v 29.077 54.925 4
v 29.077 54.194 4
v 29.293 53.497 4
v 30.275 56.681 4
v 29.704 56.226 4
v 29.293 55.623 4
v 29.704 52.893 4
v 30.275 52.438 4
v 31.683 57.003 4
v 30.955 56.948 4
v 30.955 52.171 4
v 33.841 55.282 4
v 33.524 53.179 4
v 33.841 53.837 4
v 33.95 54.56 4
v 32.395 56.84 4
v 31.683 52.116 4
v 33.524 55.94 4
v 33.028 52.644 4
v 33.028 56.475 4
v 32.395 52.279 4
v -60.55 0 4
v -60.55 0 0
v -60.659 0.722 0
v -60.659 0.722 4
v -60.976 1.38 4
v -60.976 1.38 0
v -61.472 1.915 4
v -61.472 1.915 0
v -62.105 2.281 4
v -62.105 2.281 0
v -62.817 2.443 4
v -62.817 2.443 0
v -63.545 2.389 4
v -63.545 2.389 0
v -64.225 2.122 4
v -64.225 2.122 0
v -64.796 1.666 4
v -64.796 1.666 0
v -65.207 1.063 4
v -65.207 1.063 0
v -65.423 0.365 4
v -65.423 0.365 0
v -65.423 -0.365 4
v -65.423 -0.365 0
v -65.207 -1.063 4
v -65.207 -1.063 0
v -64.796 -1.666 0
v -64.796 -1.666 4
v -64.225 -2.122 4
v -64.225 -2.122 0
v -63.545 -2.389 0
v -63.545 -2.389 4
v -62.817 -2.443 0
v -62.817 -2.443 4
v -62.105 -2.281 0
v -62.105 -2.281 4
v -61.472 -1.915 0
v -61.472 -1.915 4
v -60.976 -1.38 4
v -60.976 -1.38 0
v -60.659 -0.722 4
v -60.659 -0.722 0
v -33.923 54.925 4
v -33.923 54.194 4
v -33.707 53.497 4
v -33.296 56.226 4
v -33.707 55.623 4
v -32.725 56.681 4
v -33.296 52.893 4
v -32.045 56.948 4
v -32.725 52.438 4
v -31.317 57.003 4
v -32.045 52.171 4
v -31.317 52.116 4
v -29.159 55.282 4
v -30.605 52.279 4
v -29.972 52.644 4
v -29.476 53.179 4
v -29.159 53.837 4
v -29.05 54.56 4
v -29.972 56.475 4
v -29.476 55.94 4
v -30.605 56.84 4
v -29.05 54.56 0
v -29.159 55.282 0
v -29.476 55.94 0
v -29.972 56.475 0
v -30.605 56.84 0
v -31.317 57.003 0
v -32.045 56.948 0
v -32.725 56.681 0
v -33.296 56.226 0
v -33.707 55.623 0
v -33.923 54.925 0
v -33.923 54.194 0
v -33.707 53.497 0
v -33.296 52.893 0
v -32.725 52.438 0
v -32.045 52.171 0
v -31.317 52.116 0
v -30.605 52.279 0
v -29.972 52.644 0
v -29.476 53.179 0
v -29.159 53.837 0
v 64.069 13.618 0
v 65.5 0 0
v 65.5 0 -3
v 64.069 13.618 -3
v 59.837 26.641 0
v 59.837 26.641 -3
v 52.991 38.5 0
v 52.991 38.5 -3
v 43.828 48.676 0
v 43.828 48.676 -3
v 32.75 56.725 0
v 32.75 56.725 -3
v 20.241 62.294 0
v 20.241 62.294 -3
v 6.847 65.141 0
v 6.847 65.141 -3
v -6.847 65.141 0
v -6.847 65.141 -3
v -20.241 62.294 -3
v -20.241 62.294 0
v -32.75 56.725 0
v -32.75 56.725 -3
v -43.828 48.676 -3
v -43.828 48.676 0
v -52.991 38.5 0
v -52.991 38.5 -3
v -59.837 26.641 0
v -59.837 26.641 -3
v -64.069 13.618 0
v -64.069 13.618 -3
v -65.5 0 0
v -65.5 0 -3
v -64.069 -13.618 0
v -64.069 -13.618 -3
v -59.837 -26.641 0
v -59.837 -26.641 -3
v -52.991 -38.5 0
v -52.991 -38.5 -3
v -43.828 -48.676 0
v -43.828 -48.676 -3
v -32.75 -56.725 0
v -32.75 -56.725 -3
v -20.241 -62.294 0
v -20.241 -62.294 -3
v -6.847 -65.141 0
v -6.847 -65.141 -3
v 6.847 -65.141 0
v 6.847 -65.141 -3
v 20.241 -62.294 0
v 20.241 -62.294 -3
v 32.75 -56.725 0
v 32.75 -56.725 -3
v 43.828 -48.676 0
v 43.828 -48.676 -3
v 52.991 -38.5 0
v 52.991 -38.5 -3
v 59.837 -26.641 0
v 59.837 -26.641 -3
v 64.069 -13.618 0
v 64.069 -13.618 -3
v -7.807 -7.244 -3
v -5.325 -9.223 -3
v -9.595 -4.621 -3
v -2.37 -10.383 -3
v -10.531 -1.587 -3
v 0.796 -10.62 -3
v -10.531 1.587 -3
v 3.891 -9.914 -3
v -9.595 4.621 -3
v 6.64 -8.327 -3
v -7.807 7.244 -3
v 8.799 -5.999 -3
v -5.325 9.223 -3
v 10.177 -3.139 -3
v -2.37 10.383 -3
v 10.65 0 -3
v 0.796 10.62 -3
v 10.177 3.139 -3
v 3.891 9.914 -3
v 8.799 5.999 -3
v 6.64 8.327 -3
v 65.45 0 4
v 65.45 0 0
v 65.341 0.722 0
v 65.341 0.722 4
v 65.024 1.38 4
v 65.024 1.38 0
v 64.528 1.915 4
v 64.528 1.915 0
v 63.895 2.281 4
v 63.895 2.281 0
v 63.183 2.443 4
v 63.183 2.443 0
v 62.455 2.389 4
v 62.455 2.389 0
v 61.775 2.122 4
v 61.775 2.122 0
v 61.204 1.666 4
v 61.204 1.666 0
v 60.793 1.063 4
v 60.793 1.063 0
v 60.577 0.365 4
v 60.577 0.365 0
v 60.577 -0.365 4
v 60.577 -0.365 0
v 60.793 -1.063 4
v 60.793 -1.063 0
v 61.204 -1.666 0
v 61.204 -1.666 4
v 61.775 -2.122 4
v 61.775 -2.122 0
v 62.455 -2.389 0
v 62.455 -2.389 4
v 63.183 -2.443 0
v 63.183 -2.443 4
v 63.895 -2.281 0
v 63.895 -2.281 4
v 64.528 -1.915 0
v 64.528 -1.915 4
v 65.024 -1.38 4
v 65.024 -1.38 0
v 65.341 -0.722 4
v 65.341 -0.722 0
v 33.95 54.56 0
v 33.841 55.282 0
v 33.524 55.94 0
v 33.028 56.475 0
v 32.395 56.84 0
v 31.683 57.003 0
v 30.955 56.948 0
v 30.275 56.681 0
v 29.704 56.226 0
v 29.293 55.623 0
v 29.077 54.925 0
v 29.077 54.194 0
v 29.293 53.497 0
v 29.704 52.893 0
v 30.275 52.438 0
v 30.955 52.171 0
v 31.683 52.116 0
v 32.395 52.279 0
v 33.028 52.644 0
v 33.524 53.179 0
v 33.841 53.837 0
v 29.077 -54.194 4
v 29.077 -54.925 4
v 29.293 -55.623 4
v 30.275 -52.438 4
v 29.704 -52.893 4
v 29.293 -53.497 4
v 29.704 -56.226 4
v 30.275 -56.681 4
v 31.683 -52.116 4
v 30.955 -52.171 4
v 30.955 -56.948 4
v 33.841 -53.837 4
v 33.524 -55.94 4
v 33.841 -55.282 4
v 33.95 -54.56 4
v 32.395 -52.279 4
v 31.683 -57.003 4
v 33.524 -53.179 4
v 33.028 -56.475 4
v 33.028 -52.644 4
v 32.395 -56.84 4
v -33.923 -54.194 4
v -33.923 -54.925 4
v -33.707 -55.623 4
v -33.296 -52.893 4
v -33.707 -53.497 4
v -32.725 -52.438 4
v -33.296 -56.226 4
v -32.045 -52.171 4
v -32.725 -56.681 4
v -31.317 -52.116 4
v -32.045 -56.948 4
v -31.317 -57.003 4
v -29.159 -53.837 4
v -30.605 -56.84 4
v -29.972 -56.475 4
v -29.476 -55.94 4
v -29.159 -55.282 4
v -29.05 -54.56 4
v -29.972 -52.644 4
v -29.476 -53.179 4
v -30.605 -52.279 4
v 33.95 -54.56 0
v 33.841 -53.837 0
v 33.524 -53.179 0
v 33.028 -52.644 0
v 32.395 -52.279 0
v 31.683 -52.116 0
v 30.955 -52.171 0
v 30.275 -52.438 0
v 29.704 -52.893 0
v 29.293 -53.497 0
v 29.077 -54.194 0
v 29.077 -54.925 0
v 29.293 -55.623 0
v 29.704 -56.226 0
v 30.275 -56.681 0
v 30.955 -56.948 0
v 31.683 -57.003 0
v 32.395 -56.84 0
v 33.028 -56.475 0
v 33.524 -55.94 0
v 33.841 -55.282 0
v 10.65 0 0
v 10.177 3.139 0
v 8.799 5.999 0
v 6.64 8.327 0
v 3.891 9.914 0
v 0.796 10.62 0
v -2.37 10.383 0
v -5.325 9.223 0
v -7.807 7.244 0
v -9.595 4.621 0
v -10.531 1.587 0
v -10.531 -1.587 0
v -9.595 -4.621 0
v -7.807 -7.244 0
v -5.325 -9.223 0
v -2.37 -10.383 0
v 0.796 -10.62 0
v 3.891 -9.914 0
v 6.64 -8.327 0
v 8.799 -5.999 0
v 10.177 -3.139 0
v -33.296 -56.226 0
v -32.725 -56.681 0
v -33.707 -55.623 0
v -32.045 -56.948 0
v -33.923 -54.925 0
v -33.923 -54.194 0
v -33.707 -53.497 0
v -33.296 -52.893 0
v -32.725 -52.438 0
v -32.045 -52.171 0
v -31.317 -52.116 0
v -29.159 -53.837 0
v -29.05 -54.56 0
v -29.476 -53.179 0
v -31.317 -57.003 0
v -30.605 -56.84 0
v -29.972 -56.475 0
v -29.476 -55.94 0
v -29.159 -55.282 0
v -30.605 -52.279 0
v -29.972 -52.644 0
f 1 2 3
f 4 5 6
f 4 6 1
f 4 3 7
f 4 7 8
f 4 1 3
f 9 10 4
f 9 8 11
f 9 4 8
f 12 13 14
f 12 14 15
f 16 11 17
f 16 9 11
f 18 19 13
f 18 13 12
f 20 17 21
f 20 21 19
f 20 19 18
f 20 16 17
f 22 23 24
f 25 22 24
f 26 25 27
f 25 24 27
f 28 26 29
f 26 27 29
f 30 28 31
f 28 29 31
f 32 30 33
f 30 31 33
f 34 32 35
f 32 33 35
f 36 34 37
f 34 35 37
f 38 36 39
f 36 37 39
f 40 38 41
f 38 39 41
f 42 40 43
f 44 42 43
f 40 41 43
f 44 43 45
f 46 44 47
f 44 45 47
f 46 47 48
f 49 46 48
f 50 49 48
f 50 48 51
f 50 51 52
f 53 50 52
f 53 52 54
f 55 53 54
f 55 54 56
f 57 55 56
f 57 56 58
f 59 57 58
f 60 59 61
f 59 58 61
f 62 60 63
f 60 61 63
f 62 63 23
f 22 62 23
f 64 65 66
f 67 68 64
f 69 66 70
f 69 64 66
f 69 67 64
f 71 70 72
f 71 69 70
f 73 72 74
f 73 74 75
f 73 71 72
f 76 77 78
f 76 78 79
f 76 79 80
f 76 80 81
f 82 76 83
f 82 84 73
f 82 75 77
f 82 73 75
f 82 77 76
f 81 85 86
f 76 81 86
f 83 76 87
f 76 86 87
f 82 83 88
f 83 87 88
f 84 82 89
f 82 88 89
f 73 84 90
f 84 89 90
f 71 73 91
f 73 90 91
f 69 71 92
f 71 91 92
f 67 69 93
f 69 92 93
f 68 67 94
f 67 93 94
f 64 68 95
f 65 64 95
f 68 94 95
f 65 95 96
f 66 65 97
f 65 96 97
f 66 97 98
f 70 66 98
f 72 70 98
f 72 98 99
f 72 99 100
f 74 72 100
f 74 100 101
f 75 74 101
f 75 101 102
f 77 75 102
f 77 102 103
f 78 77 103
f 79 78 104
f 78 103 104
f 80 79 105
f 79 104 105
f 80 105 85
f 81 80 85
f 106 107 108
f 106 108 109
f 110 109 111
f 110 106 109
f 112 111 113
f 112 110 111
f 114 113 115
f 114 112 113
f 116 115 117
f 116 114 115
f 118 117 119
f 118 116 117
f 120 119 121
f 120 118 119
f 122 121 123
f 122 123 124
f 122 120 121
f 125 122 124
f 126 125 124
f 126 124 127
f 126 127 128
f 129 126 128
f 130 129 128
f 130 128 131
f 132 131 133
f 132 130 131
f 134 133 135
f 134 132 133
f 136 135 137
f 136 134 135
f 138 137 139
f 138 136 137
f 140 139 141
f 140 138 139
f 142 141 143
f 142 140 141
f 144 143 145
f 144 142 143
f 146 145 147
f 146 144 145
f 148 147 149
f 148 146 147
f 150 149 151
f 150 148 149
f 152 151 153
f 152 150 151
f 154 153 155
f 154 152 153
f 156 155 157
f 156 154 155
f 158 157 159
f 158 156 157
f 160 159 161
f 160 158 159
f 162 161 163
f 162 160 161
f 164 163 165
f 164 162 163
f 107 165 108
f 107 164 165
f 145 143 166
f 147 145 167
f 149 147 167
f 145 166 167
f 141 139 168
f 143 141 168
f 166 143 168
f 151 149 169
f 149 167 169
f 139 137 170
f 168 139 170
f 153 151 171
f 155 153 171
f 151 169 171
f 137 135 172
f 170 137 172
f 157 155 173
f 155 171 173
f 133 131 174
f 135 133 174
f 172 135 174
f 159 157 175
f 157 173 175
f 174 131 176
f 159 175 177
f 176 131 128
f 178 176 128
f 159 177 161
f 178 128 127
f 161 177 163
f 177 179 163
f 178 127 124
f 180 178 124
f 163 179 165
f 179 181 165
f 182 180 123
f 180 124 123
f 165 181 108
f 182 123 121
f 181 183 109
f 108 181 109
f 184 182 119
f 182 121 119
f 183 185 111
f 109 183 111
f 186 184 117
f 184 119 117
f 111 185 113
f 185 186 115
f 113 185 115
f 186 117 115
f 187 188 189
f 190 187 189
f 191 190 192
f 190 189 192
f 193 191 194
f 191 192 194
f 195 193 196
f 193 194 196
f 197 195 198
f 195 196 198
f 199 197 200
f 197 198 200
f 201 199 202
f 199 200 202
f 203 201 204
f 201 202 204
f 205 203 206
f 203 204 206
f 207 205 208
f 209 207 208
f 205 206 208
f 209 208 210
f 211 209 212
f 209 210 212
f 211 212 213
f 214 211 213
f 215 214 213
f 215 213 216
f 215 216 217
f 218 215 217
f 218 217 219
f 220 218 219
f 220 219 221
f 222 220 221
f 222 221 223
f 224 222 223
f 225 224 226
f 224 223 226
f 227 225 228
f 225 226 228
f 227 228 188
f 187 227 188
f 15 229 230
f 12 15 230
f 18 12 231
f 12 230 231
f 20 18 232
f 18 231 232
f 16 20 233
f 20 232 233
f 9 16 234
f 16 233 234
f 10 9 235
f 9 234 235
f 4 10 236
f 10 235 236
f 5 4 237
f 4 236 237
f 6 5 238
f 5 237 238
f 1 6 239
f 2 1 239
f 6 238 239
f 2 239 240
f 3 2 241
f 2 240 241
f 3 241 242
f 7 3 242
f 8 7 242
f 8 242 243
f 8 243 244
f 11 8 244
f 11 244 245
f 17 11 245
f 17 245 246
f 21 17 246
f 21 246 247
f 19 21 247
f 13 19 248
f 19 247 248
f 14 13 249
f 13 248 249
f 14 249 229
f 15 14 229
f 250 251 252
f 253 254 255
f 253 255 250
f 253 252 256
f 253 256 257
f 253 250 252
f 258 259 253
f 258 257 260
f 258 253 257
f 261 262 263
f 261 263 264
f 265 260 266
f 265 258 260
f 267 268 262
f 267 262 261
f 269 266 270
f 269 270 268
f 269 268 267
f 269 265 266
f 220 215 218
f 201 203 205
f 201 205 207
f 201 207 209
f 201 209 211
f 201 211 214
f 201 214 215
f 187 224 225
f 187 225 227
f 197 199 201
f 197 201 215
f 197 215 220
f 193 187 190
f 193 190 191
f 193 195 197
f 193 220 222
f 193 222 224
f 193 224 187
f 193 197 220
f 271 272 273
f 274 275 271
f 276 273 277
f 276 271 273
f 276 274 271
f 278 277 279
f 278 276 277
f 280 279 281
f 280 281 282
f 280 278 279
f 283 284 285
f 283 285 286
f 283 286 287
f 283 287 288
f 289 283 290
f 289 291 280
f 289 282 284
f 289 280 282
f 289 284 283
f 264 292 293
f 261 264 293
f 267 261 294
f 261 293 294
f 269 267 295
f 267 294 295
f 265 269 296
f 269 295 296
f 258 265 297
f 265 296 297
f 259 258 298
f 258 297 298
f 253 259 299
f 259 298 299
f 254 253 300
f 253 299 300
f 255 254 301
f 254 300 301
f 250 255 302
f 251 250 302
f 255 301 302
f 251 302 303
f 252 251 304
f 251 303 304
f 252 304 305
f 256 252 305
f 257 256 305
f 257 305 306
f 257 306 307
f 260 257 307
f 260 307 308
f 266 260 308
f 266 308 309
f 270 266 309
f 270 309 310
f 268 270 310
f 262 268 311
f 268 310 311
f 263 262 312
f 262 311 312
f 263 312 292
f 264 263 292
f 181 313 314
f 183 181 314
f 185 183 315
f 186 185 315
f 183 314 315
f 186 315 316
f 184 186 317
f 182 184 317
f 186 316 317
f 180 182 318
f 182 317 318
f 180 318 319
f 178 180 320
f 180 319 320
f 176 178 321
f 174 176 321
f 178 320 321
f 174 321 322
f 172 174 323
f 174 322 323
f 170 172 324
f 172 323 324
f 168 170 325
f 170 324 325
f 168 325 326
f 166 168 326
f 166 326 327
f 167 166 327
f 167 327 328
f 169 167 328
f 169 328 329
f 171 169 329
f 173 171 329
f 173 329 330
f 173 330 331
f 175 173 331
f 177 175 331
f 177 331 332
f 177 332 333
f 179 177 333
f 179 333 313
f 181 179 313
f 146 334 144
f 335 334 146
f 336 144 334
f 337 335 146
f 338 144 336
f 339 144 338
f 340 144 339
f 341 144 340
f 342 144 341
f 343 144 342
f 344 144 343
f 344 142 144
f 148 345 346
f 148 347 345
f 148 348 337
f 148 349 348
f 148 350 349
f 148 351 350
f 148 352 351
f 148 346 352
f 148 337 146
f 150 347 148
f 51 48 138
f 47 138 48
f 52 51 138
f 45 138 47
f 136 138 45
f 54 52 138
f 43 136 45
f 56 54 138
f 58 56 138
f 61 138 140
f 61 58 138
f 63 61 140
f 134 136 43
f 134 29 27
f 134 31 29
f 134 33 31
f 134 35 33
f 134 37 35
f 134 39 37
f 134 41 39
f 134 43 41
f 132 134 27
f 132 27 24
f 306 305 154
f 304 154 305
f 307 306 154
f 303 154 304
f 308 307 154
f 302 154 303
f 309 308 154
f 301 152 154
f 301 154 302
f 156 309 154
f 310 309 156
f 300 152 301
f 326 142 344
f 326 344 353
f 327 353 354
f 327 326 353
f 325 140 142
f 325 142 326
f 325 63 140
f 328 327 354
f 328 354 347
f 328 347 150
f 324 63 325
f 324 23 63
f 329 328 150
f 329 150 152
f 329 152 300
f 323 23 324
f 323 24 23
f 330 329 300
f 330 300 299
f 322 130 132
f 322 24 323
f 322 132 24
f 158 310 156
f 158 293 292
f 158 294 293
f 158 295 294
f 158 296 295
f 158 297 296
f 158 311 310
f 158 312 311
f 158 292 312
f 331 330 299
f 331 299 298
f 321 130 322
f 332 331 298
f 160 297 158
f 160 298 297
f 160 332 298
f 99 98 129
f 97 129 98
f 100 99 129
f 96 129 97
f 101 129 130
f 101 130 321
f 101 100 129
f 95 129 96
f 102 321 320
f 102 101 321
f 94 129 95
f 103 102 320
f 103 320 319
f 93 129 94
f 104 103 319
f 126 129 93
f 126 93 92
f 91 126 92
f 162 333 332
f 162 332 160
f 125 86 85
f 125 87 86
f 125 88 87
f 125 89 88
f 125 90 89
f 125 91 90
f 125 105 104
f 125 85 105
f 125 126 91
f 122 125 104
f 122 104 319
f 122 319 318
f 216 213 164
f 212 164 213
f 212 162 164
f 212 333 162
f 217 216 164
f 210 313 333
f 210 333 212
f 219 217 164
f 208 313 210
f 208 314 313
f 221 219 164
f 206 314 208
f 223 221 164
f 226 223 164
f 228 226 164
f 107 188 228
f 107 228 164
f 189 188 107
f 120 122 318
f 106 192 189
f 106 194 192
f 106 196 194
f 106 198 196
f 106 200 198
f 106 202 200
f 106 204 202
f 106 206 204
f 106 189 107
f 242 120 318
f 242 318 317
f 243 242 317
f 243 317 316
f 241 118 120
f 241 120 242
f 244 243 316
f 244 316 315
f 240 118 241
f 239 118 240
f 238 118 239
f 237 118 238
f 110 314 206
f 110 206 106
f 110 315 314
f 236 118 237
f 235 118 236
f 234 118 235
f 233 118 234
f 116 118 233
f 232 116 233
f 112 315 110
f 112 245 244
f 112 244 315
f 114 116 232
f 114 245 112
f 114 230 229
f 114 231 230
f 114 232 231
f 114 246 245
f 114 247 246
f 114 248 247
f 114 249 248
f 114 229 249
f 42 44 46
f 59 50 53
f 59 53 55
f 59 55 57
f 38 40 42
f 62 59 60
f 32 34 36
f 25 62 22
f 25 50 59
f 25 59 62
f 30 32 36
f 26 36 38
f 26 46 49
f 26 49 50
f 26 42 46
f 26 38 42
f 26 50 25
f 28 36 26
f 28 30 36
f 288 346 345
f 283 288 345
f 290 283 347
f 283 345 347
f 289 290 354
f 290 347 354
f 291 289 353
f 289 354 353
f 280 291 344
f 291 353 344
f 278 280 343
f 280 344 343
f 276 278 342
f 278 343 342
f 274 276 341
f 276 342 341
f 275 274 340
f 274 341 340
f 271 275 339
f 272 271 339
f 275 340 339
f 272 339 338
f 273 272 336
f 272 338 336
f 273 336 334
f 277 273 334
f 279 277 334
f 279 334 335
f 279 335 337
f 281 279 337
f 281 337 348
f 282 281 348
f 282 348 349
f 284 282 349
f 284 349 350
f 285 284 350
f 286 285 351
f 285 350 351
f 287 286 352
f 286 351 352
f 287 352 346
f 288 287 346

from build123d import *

# Parameters (mm, degrees)
SKETCH_1_R          = 65.5
EXTRUDE_1_DEPTH     = 3
SKETCH_2_R          = 2.45
EXTRUDE_2_DEPTH     = 4
SKETCH_3_R          = 10.65
CUT_EXTRUDE_1_DEPTH = 93.717312299


with BuildPart() as part:
    # 草图1 → 凸台-拉伸1 (new body)
    with BuildSketch(Plane.XY):
        Circle(SKETCH_1_R)
    extrude(amount=-EXTRUDE_1_DEPTH)

    # 草图2 → 凸台-拉伸2 (add)
    with BuildSketch(Plane.XY):
        with Locations((-63, 0)):
            Circle(SKETCH_2_R)
        with Locations((-31.5, 54.559600438)):
            Circle(SKETCH_2_R)
        with Locations((31.5, 54.559600438)):
            Circle(SKETCH_2_R)
        with Locations((63, 0)):
            Circle(SKETCH_2_R)
        with Locations((31.5, -54.559600438)):
            Circle(SKETCH_2_R)
        with Locations((-31.5, -54.559600438)):
            Circle(SKETCH_2_R)
    extrude(amount=EXTRUDE_2_DEPTH)

    # 草图3 → 切除-拉伸1 (cut, through all)
    with BuildSketch(Plane.XY):
        Circle(SKETCH_3_R)
    extrude(amount=-CUT_EXTRUDE_1_DEPTH, mode=Mode.SUBTRACT)


solid = part.part
